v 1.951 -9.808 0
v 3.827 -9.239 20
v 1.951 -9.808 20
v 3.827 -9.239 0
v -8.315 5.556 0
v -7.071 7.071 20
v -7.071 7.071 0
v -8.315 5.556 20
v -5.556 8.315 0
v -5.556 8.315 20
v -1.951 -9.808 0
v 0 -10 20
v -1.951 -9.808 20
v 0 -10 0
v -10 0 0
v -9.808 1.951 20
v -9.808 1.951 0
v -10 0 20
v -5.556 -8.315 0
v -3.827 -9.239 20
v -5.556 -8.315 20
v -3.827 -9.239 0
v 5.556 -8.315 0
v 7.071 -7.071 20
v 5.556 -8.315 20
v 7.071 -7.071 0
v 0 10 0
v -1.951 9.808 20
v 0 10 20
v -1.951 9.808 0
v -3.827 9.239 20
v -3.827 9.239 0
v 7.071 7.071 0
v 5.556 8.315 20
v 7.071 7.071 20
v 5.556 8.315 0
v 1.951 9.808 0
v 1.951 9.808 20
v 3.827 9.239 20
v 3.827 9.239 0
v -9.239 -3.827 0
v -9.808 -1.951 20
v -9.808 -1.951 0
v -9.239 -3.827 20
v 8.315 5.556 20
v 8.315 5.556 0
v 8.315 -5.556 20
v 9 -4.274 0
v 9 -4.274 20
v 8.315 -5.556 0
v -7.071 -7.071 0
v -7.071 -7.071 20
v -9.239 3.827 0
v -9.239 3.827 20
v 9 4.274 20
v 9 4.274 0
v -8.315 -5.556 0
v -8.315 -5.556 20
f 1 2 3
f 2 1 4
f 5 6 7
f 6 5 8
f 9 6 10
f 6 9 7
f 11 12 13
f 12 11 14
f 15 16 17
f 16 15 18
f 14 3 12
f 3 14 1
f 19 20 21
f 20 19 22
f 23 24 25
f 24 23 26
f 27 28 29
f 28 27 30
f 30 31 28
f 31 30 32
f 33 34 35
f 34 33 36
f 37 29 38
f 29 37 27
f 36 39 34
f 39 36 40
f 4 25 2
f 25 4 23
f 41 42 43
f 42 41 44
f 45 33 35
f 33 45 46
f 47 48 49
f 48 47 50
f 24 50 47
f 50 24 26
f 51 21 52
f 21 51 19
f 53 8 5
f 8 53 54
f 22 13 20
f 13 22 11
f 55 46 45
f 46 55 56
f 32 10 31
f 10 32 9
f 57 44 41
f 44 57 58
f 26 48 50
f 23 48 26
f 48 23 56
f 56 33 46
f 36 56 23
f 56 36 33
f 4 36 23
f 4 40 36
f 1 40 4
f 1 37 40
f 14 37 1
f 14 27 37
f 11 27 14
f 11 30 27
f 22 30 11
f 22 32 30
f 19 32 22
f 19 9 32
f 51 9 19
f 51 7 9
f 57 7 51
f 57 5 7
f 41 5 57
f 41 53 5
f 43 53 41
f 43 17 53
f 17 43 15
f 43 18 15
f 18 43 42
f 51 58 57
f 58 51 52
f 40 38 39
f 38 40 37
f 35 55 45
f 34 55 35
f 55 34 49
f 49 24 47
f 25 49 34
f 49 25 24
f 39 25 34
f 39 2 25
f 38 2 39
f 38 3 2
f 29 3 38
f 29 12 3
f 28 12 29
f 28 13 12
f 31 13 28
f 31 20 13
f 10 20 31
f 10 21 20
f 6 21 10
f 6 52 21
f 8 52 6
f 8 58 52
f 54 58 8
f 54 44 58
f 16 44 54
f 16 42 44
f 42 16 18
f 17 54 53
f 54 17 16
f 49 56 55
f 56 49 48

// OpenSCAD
// A D-shaft: a cylinder with a flat milled at 0.9 of its radius.
//
// Where the flat meets the wall, the wall's normal is at 0.9 to the flat's. The
// corner placement used to tell a chord facet of a surface from a face of the
// model by that angle - a chord's normal is near the surface's - with cos(pi/6)
// in one pass and 0.5 in another, so this flat was a chord to both and a
// shallower one would have been a face to one and a chord to the other (open
// item 39, R4). Which it is was never an angle's to say. The flat is named for
// the plane its maker declared, the cube's x = 9 face, and the wall's facets
// for the cylinder: the flat is a face and the facets are chords, by their
// names, whatever the angle.
//
// Where each cap meets the flat's two edges, the cap, the flat and the cylinder
// cross: four corners where three exact things meet, placed where all three
// cross. Taken for a chord, the flat constrained nothing and none of the four
// was placed.
// APPROX: 4 where three exact things meet
//
// The volume, bracketed as the other fixtures are. The smooth solid is the
// circle less the segment beyond x = 9, 100 acos(0.9) - 9 sqrt(19) = 5.872591,
// times 20: 6165.733493. The mesh is OpenSCAD's own 32-gon from angle 0, clipped
// at x = 9, times 20: 6130.948933. The export lies between.
// VOLUME: 6148.341213 +/- 17.392280
// VOLUME-APPROX: 6148.341213 +/- 17.392280
//
// The two facets the flat cuts are named for the cylinder and left as planes -
// cut facets are not in their surface's D0 region yet (open item 34), as on
// step-cap-meets-wall. Tolerated by name; the test fails the day it is no
// longer raised.
// KNOWN-EXPORT-ERROR: facets named by their maker for a declared surface are not written on it

$fn = 32;
difference() {
  cylinder(r = 10, h = 20);
  translate([9, -20, -1]) cube([10, 40, 22]);
}
